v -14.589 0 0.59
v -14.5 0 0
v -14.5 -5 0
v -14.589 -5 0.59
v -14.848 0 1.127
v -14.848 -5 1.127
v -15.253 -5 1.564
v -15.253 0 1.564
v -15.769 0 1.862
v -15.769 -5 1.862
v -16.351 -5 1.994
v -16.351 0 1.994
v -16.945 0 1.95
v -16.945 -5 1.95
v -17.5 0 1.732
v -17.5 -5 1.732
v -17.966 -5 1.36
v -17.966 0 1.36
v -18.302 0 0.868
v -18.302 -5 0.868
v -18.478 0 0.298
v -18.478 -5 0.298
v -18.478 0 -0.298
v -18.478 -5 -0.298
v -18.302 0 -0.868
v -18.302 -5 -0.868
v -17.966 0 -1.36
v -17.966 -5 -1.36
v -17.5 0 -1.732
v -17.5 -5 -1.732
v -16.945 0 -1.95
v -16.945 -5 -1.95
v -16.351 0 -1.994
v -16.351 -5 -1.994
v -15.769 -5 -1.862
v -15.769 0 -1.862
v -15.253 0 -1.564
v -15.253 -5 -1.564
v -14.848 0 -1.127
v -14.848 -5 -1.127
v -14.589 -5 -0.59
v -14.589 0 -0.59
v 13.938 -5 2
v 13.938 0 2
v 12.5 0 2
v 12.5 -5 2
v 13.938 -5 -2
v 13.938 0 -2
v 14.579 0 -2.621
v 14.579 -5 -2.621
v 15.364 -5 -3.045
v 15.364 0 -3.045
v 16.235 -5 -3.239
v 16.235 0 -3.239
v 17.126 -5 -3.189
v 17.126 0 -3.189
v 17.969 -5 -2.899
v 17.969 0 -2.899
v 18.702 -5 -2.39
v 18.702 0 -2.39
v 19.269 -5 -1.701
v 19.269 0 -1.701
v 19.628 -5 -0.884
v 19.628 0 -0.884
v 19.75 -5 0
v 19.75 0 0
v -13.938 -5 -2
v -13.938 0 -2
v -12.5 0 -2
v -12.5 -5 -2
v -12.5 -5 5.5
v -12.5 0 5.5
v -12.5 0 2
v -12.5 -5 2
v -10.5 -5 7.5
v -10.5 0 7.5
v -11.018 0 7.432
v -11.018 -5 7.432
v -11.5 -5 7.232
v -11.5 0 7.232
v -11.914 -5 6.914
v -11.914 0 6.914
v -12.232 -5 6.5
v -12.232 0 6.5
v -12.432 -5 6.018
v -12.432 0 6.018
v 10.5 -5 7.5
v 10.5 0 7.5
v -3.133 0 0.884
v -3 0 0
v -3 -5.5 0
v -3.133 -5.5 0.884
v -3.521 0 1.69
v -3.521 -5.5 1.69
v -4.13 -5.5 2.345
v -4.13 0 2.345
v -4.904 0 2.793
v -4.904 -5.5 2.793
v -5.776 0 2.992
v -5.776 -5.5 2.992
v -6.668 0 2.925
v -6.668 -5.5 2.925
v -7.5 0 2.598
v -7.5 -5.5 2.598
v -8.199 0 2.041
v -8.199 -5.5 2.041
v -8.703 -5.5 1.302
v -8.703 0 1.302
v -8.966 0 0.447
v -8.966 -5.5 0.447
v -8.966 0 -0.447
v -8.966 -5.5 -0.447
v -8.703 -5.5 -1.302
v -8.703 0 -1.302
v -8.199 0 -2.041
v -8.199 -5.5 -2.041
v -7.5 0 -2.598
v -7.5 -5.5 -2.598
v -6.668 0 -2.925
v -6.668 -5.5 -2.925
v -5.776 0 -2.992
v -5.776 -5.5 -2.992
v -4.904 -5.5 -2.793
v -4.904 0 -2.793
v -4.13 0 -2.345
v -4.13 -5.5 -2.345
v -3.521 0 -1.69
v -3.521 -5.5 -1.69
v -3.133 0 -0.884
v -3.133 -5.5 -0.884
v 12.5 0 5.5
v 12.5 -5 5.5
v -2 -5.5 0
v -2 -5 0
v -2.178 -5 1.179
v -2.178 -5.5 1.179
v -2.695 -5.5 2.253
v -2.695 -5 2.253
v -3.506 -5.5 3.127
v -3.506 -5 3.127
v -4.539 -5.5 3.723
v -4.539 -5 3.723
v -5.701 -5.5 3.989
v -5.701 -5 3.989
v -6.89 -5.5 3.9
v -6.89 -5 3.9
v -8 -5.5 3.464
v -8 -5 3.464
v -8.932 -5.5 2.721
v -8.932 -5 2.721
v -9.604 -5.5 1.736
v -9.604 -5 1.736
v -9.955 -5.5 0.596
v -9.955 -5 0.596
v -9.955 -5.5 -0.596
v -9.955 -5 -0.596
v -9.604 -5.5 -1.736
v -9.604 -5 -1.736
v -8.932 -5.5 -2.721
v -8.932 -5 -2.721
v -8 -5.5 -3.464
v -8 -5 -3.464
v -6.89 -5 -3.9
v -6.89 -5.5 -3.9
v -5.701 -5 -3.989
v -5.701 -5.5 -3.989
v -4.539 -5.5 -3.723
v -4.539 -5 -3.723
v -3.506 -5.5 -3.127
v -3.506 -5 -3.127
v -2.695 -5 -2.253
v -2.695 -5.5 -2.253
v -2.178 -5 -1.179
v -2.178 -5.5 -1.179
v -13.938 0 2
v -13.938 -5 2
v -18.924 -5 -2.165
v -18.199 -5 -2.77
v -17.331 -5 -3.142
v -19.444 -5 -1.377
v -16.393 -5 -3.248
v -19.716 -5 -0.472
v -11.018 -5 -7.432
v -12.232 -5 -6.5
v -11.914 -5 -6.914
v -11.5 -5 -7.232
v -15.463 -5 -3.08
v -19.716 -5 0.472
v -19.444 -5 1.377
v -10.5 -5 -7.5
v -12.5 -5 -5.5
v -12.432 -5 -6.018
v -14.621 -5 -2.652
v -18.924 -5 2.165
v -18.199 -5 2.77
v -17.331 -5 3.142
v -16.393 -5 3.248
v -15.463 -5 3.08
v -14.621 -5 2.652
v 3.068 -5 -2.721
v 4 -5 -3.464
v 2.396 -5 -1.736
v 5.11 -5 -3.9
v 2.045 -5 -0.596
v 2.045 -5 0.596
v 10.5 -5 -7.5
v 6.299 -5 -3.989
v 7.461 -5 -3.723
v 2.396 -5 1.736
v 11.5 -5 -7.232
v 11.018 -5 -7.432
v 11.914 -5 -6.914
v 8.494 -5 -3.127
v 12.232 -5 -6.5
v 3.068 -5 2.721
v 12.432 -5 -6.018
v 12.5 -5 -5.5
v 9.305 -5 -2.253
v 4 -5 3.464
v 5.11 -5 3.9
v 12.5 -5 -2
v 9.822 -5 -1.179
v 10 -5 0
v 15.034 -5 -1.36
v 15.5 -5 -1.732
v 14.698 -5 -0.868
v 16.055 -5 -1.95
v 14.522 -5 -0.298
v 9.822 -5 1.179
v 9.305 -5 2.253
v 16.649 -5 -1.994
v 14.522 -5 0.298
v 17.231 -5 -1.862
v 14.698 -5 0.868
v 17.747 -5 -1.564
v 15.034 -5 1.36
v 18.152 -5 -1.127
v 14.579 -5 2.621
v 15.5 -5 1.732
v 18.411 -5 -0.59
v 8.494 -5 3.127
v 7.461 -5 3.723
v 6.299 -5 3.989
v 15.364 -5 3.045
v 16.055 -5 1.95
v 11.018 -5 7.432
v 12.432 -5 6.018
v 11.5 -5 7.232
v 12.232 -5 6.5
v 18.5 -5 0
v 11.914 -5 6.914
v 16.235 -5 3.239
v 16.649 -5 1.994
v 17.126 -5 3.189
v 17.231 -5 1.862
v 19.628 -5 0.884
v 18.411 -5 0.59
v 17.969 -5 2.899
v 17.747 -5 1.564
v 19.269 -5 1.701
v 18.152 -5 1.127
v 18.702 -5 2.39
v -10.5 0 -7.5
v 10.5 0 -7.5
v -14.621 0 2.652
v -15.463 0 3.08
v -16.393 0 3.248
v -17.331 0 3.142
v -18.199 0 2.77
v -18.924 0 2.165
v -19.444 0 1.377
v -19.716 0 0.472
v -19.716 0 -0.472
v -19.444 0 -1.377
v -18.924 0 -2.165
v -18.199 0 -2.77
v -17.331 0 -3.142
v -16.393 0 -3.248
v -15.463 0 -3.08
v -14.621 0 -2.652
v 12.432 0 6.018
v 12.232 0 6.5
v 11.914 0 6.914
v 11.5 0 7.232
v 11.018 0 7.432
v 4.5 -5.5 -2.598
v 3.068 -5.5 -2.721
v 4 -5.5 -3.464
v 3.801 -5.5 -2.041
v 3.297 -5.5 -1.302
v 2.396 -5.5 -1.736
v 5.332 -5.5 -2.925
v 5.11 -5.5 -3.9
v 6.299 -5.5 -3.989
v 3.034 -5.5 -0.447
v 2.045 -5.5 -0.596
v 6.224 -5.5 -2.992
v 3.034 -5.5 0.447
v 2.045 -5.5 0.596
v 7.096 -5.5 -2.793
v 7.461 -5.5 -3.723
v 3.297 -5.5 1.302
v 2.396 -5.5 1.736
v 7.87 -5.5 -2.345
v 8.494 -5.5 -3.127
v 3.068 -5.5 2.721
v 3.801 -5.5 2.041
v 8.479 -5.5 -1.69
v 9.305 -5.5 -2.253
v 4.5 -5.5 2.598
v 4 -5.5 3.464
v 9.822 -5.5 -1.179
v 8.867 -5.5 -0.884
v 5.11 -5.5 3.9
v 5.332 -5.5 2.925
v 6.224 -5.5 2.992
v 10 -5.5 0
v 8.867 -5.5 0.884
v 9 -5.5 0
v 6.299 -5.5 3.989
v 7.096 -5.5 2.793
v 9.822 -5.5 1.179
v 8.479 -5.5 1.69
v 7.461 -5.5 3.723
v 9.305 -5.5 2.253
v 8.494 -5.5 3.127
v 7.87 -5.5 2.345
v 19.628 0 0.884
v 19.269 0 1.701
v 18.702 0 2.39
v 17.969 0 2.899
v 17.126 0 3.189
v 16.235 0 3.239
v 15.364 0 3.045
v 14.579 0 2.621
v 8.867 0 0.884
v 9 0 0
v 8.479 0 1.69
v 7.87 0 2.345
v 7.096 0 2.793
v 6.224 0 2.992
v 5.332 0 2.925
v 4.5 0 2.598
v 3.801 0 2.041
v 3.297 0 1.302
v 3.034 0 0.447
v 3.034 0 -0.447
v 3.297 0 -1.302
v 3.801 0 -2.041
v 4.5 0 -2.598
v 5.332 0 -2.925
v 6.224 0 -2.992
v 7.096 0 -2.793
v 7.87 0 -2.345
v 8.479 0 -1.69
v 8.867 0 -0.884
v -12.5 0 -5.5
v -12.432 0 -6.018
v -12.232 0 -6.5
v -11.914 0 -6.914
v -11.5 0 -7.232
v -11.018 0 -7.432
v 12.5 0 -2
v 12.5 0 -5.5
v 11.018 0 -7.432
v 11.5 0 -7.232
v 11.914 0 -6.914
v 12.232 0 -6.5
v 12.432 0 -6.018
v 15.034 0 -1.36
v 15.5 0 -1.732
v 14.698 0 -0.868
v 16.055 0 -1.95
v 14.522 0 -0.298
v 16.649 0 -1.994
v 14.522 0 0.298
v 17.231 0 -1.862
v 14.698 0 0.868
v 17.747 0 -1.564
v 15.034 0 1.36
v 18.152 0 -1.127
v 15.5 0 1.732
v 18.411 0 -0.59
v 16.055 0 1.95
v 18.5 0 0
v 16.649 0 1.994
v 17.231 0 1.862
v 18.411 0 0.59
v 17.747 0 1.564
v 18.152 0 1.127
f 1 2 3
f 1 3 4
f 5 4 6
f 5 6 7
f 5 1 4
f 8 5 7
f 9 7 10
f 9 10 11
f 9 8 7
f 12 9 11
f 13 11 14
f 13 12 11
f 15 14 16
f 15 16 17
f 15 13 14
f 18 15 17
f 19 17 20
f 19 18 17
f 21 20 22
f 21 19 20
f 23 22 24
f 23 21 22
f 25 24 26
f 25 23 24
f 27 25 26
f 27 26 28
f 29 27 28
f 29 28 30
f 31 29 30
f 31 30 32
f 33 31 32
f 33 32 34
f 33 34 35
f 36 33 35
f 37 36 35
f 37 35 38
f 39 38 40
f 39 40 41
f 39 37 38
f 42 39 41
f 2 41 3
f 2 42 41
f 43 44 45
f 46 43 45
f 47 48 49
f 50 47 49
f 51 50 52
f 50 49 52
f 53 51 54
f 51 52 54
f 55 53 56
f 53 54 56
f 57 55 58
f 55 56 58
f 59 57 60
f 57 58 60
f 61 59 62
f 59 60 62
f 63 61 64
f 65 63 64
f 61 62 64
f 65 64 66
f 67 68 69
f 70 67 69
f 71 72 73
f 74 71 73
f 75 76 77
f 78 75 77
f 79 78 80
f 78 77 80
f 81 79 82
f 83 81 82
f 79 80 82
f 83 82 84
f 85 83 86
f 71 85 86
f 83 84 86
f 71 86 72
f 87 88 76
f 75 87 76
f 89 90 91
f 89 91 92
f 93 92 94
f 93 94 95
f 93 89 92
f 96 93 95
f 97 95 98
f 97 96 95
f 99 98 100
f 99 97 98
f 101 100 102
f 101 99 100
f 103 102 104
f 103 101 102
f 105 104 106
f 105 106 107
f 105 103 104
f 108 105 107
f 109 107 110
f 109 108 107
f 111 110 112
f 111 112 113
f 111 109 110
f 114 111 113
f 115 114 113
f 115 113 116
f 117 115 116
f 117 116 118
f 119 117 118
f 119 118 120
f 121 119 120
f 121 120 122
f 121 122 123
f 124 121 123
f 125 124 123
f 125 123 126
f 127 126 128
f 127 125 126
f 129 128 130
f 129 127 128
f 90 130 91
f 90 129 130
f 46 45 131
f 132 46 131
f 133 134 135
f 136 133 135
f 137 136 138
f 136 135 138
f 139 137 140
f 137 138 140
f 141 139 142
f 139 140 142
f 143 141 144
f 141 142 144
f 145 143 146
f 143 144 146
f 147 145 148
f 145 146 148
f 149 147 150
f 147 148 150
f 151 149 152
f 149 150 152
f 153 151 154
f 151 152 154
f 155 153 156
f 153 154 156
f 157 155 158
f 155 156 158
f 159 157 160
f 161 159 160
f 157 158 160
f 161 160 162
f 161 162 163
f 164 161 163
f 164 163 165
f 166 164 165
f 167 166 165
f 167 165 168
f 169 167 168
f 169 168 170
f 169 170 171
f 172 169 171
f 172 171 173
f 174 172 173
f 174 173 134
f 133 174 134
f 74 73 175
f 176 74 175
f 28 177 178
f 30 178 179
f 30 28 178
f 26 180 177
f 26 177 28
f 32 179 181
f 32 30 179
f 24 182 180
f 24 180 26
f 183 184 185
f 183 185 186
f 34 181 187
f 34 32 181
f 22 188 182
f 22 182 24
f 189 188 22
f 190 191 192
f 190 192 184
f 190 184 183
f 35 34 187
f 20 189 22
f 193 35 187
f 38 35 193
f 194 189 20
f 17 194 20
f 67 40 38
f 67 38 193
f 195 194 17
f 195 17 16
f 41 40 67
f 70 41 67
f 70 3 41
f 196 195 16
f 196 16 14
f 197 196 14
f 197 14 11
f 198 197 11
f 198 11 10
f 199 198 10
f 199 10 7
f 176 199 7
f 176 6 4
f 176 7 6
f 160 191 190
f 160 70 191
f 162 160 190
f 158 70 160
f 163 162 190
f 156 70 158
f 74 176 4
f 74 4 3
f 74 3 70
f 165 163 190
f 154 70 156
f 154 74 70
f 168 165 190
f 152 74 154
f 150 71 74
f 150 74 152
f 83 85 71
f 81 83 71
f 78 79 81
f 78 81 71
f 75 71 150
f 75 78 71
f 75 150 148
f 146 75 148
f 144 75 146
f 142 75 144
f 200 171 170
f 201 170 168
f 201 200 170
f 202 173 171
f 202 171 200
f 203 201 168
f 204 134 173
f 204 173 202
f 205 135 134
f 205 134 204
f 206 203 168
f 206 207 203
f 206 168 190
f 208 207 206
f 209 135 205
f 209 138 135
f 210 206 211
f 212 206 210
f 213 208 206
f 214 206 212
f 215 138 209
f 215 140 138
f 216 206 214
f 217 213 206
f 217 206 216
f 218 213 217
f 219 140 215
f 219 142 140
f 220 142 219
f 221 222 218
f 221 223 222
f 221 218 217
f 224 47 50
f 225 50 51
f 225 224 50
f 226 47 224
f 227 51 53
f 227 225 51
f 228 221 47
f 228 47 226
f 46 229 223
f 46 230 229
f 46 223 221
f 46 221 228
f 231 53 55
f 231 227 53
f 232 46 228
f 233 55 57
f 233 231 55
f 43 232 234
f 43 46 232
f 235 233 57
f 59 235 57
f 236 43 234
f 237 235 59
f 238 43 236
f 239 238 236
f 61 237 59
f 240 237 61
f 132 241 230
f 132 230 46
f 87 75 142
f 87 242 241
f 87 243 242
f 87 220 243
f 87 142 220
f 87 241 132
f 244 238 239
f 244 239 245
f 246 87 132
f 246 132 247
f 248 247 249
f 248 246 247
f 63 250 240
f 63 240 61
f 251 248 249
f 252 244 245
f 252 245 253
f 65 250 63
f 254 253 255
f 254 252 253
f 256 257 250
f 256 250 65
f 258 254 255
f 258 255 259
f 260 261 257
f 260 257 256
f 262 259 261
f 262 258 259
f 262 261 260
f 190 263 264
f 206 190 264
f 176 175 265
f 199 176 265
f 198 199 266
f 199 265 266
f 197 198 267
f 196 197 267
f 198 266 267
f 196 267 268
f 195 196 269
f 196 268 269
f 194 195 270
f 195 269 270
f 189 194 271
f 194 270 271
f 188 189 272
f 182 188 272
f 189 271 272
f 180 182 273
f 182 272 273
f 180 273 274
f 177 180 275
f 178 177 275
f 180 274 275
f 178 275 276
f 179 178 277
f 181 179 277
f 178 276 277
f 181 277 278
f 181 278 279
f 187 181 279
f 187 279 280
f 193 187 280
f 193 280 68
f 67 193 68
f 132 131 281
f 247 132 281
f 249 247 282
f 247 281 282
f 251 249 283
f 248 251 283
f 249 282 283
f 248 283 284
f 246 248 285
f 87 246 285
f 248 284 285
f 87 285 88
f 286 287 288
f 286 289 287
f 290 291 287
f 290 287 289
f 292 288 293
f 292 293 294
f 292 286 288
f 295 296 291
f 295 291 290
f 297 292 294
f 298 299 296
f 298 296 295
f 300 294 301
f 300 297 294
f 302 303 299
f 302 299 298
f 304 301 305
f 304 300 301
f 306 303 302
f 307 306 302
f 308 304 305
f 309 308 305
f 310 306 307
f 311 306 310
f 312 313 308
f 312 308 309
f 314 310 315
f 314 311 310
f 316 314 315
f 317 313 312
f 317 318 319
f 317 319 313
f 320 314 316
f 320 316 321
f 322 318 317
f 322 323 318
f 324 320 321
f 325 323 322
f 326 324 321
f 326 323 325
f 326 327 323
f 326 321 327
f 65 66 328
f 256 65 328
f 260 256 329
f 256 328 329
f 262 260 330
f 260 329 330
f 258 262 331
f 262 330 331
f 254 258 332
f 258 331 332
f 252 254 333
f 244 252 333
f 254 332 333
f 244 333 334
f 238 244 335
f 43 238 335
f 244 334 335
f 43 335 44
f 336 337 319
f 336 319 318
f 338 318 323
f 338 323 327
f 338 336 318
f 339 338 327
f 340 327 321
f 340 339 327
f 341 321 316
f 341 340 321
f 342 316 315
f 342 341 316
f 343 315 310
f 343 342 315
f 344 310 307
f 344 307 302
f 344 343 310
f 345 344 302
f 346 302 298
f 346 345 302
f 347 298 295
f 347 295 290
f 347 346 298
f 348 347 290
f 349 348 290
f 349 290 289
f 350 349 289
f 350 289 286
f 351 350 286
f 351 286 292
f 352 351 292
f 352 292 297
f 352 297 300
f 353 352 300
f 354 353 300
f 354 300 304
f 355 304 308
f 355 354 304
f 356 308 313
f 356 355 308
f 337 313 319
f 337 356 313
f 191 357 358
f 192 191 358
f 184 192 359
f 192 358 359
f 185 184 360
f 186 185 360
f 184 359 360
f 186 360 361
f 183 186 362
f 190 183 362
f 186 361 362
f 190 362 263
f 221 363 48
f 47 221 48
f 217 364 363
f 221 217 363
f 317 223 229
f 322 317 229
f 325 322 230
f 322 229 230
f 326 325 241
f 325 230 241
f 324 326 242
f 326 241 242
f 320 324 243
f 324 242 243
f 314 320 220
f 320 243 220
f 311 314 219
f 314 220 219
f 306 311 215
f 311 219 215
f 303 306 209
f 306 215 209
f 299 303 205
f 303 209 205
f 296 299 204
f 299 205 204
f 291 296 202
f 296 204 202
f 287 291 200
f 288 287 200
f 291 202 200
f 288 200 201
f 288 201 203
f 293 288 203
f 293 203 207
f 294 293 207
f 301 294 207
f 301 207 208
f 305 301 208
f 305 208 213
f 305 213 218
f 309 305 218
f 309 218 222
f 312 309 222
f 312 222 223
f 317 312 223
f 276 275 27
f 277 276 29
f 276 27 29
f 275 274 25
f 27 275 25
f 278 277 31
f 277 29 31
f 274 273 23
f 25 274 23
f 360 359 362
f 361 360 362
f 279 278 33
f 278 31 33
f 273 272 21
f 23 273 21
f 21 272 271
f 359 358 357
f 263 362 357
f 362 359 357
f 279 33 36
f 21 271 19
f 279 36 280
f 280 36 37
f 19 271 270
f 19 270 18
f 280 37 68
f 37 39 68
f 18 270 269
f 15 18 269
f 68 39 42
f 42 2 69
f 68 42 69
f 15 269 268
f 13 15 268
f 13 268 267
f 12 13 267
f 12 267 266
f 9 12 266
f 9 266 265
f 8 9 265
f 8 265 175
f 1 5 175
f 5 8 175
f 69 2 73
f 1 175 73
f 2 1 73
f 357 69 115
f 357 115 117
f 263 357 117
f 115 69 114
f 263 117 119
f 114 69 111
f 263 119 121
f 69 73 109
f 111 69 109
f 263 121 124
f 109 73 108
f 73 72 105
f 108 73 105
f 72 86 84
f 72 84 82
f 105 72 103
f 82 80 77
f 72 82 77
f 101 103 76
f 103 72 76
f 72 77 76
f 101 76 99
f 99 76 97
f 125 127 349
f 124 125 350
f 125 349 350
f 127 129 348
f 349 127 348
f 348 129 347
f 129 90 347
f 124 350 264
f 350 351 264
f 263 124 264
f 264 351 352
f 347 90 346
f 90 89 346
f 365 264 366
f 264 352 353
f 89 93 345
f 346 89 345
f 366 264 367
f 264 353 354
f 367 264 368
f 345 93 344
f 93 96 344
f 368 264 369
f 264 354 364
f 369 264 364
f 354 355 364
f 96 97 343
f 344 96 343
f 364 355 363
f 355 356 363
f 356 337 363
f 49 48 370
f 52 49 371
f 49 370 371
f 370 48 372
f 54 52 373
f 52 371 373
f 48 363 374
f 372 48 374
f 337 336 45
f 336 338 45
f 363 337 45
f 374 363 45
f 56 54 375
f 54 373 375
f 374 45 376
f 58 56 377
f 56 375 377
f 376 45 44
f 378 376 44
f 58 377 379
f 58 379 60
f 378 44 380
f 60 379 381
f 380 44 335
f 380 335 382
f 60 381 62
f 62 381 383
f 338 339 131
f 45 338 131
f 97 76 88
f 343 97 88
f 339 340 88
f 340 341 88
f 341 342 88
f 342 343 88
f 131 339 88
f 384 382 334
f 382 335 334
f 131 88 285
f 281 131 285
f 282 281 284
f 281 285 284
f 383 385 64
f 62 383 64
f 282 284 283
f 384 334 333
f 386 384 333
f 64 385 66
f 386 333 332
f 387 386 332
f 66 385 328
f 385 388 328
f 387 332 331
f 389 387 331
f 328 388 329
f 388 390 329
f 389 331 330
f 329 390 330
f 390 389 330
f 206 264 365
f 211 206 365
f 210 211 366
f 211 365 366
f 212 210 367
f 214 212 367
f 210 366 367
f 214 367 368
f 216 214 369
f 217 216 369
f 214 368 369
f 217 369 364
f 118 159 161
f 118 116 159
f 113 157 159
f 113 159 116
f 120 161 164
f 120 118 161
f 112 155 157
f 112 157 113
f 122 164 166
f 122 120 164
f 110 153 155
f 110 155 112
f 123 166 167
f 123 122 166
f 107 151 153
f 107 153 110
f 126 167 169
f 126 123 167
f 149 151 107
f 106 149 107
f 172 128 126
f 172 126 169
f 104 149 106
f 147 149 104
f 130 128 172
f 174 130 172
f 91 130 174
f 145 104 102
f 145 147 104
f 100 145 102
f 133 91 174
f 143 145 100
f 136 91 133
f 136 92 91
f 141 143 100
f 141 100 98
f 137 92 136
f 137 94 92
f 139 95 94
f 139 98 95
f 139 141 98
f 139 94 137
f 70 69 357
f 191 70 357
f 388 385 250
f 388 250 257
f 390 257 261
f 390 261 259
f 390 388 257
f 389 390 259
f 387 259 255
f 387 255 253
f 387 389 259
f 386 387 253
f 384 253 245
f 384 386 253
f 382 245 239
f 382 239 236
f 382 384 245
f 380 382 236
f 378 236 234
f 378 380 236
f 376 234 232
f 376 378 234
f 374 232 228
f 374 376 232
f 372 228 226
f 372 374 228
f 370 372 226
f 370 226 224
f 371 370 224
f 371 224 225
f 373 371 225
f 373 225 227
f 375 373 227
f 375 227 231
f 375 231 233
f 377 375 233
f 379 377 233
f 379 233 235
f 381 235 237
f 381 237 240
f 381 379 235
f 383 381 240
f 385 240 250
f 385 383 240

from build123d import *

# Parameters (mm, degrees)
F0_R     = 2
F0_R_2   = 4
F1_DEPTH = 5
F0_R_3   = 3
F2_DEPTH = 5.5


with BuildPart() as f1:
    # F0 (on Front) → F1 (new body)
    with BuildSketch(Plane.XZ):
        with BuildLine():
            Line((14.2, -2), (13.938262, -2))
            ThreePointArc((13.938262, -2), (17.557557, -3.073121), (19.75, 0))
            ThreePointArc((19.75, 0), (17.557557, 3.073121), (13.938262, 2))
            Line((13.938262, 2), (14.2, 2))
            Line((14.2, 2), (14.2, -2))
        make_face()
        with Locations((16.5, 0)):
            Circle(F0_R, mode=Mode.SUBTRACT)
        with BuildLine():
            ThreePointArc((13.938262, 2), (13.25, 0), (13.938262, -2))
            Line((13.938262, -2), (14.2, -2))
            Line((14.2, -2), (14.2, 2))
            Line((14.2, 2), (13.938262, 2))
        make_face()
        with BuildLine():
            Line((12.5, 2), (12.5, -2))
            Line((12.5, -2), (13.938262, -2))
            ThreePointArc((13.938262, -2), (13.25, 0), (13.938262, 2))
            Line((13.938262, 2), (12.5, 2))
        make_face()
        with BuildLine():
            ThreePointArc((-13.938262, 2), (-19.75, 0), (-13.938262, -2))
            Line((-13.938262, -2), (-14.2, -2))
            Line((-14.2, -2), (-14.2, 2))
            Line((-14.2, 2), (-13.938262, 2))
        make_face()
        with Locations((-16.5, 0)):
            Circle(F0_R, mode=Mode.SUBTRACT)
        with BuildLine():
            Line((-14.2, -2), (-13.938262, -2))
            ThreePointArc((-13.938262, -2), (-13.426879, -1.057557), (-13.25, 0))
            ThreePointArc((-13.25, 0), (-13.426879, 1.057557), (-13.938262, 2))
            Line((-13.938262, 2), (-14.2, 2))
            Line((-14.2, 2), (-14.2, -2))
        make_face()
        with BuildLine():
            Line((-13.938262, -2), (-12.5, -2))
            Line((-12.5, -2), (-12.5, 2))
            Line((-12.5, 2), (-13.938262, 2))
            ThreePointArc((-13.938262, 2), (-13.426879, 1.057557), (-13.25, 0))
            ThreePointArc((-13.25, 0), (-13.426879, -1.057557), (-13.938262, -2))
        make_face()
        with BuildLine():
            Line((-10.5, -7.5), (10.5, -7.5))
            ThreePointArc((10.5, -7.5), (11.914214, -6.914214), (12.5, -5.5))
            Line((12.5, -5.5), (12.5, -2))
            Line((12.5, -2), (12.5, 2))
            Line((12.5, 2), (12.5, 5.5))
            ThreePointArc((12.5, 5.5), (11.914214, 6.914214), (10.5, 7.5))
            Line((10.5, 7.5), (-10.5, 7.5))
            ThreePointArc((-10.5, 7.5), (-11.914214, 6.914214), (-12.5, 5.5))
            Line((-12.5, 5.5), (-12.5, 2))
            Line((-12.5, 2), (-12.5, -2))
            Line((-12.5, -2), (-12.5, -5.5))
            ThreePointArc((-12.5, -5.5), (-11.914214, -6.914214), (-10.5, -7.5))
        make_face()
        with Locations((-6, 0)):
            Circle(F0_R_2, mode=Mode.SUBTRACT)
        with Locations((6, 0)):
            Circle(F0_R_2, mode=Mode.SUBTRACT)
    extrude(amount=F1_DEPTH)

    # F0 (on Front) → F2 (join)
    with BuildSketch(Plane.XZ):
        with Locations((-6, 0)):
            Circle(F0_R_2)
        with Locations((-6, 0)):
            Circle(F0_R_3, mode=Mode.SUBTRACT)
        with Locations((6, 0)):
            Circle(F0_R_2)
        with Locations((6, 0)):
            Circle(F0_R_3, mode=Mode.SUBTRACT)
    extrude(amount=F2_DEPTH)


solid = f1.part
